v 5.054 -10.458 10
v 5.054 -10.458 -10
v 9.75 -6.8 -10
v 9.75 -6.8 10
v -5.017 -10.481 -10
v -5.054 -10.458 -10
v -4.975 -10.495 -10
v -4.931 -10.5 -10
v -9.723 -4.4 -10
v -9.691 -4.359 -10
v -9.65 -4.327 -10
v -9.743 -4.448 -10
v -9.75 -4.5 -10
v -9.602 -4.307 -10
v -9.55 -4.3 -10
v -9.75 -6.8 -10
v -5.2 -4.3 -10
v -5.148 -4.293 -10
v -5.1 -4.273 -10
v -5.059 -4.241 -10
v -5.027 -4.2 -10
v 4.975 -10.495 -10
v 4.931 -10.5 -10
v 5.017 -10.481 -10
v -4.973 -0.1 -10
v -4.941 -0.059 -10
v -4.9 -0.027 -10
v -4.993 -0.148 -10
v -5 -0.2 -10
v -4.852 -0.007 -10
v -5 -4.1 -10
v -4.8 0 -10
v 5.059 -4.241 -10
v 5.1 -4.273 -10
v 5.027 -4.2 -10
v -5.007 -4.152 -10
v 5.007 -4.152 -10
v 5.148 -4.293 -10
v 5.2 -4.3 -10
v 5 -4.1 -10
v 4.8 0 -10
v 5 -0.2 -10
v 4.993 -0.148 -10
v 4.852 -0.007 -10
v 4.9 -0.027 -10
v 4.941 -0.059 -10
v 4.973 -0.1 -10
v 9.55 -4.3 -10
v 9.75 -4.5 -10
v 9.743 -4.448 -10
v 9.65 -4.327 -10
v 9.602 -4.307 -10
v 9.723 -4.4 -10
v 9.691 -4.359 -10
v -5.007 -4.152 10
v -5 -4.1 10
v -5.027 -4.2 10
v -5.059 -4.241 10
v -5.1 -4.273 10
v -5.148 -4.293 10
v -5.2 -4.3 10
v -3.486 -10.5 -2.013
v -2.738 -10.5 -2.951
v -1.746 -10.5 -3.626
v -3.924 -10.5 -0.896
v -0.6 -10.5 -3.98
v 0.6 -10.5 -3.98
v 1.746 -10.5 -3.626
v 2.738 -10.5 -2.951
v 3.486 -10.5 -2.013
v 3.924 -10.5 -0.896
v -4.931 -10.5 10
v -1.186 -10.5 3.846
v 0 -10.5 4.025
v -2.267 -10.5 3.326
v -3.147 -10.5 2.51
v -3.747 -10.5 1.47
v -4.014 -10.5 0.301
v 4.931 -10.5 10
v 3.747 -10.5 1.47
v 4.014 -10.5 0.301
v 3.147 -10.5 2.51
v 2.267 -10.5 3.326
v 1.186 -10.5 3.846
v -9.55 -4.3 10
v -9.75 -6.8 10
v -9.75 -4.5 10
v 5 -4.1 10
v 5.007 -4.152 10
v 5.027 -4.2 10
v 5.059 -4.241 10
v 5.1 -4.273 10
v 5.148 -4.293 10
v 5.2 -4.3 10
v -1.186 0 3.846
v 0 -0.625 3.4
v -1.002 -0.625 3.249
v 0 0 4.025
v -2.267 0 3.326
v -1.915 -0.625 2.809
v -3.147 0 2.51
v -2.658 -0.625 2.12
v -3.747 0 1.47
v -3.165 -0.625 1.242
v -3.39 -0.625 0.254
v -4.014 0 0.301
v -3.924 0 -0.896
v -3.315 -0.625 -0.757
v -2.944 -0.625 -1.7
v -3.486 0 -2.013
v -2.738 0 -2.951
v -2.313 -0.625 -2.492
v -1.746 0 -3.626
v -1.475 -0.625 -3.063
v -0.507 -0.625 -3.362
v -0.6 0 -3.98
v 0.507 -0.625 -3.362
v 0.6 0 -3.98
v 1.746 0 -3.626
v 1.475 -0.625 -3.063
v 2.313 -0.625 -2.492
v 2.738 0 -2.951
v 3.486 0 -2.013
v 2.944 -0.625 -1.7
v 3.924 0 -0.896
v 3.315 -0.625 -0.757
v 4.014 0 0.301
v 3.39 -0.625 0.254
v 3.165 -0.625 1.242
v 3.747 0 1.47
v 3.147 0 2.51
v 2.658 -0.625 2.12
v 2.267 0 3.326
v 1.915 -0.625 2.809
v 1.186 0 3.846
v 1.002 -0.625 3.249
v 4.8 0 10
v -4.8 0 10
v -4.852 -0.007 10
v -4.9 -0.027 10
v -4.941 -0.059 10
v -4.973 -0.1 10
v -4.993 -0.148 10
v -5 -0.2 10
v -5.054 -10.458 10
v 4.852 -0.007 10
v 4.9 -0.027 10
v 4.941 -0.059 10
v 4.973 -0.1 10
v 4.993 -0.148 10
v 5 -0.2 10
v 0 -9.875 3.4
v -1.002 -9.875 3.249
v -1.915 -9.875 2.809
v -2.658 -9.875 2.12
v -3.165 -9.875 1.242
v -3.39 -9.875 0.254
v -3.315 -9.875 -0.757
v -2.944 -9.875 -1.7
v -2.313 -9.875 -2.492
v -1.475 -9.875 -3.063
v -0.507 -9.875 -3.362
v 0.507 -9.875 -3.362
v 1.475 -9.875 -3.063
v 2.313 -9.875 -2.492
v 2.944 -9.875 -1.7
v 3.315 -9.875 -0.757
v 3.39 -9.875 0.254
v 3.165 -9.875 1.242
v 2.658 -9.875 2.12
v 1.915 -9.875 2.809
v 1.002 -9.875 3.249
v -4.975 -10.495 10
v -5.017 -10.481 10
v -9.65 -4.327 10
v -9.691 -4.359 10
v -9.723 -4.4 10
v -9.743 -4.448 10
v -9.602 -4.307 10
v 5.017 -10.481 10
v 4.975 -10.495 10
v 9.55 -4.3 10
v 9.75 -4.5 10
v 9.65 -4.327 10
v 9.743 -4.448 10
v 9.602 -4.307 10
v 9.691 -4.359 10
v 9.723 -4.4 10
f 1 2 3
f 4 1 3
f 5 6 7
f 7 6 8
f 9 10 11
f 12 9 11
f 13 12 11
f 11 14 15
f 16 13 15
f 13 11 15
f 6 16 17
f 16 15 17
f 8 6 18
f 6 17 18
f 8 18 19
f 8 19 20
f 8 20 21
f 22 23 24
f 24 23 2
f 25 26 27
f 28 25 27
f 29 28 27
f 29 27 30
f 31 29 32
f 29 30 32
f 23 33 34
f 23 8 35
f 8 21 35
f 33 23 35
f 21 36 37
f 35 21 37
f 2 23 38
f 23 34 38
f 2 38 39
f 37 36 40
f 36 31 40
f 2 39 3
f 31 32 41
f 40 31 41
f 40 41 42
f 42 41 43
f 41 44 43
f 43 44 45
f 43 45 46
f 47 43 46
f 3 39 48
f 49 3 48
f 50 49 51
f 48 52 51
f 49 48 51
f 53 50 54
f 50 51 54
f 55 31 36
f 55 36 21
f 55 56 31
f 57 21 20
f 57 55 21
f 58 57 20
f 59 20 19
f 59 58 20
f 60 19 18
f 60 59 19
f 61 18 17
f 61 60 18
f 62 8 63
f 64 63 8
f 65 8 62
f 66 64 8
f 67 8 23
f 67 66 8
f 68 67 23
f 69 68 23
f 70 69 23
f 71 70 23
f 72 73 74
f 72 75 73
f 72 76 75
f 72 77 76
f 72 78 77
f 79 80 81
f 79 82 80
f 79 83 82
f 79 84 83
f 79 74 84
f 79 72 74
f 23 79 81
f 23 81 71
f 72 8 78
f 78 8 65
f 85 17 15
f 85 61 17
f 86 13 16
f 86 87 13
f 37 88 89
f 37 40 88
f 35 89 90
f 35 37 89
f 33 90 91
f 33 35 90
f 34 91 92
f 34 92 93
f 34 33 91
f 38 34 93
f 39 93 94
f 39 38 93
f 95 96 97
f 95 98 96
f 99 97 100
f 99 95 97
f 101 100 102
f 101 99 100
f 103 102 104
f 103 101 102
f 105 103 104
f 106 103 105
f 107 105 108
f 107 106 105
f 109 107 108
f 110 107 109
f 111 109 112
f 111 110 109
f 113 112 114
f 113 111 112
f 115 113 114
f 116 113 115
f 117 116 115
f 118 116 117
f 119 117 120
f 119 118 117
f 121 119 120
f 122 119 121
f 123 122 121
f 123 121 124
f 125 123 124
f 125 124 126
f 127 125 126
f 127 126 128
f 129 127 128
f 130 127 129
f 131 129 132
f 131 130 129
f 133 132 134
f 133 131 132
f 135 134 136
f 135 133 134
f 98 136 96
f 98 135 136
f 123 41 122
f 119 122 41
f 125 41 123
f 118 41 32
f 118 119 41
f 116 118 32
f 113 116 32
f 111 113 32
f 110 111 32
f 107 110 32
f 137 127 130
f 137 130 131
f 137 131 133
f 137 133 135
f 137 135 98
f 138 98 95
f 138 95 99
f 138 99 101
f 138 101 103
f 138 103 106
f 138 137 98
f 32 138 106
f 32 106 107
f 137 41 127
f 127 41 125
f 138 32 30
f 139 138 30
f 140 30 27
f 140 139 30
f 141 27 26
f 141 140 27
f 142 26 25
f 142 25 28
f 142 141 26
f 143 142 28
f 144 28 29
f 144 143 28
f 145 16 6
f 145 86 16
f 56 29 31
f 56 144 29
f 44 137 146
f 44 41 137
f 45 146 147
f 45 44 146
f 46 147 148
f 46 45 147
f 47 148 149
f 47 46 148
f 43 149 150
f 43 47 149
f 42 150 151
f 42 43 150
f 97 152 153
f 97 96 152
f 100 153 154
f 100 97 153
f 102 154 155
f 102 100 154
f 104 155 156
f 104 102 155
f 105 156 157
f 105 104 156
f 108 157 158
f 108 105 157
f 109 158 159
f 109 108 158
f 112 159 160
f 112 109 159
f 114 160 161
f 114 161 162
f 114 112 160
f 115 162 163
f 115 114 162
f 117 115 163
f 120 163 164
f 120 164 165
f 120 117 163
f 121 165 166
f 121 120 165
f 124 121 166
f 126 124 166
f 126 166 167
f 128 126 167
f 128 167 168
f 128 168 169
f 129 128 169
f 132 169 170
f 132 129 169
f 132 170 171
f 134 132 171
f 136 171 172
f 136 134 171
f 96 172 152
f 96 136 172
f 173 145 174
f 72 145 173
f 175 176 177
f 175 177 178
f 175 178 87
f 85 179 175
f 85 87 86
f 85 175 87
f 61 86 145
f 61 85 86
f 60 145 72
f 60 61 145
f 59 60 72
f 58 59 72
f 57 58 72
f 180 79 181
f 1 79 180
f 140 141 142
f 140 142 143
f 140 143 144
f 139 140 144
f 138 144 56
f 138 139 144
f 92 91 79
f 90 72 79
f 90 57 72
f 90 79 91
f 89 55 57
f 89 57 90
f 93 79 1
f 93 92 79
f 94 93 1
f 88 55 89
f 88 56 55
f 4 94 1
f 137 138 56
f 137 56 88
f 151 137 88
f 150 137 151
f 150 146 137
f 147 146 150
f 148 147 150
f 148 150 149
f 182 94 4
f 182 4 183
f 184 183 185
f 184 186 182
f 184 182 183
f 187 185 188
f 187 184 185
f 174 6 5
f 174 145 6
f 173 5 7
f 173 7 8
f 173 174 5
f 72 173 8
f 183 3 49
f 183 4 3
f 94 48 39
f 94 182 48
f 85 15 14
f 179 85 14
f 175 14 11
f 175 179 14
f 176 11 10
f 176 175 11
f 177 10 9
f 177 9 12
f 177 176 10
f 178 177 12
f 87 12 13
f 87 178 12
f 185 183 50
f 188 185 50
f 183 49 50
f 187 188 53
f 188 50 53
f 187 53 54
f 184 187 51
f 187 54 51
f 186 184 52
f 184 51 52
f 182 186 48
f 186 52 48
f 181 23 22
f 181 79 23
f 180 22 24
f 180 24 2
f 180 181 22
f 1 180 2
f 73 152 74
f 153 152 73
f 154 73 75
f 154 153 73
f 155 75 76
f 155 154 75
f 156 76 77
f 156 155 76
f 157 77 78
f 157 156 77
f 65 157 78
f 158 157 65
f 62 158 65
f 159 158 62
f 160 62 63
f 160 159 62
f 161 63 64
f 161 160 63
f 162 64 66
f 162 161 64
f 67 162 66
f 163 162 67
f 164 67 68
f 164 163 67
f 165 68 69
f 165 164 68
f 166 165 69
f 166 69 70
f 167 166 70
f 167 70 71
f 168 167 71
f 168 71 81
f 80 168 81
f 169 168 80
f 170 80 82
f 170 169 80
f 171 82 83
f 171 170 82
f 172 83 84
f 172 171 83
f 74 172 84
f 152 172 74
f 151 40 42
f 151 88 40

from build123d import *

# Parameters (mm, degrees)
EXTRUDE_1_DEPTH = 10
FILLET_1_R      = 0.2


with BuildPart() as part:
    # Эскиз1 → Бобышка-Вытянуть1 (new body, symmetric)
    with BuildSketch(Plane.XY):
        Polygon((5, 0), (-5, 0), (-5, -4.3), (-9.75, -4.3), (-9.75, -6.8), (-5, -10.5), (5, -10.5), (9.75, -6.8), (9.75, -4.3), (5, -4.3), align=None)
    extrude(amount=EXTRUDE_1_DEPTH, both=True)

    # Эскиз4 → Отверстие обработанное метчиком M83 (revolve, cut)
    with BuildSketch(Plane(origin=(0, 0, 0), x_dir=(0, 0, 1), z_dir=(1, 0, 0))):
        Polygon((0, 0), (0, 10.5), (4.025, 10.5), (3.4, 9.875), (3.4, 0.625), (4.025, 0), align=None)
    revolve(axis=Axis((0, 6.35, 0), (0, -1, 0)), mode=Mode.SUBTRACT)

    # Скругление1
    fillet_1_edges = [part.edges().sort_by_distance(p)[0] for p in [
        (-5, 0, 0),
        (5, 0, 0),
        (5, -4.3, 0),
        (9.75, -4.3, 0),
        (5, -10.5, 0),
        (-5, -10.5, 0),
        (-9.75, -4.3, 0),
        (-5, -4.3, 0),
    ]]
    fillet(fillet_1_edges, radius=FILLET_1_R)


solid = part.part
